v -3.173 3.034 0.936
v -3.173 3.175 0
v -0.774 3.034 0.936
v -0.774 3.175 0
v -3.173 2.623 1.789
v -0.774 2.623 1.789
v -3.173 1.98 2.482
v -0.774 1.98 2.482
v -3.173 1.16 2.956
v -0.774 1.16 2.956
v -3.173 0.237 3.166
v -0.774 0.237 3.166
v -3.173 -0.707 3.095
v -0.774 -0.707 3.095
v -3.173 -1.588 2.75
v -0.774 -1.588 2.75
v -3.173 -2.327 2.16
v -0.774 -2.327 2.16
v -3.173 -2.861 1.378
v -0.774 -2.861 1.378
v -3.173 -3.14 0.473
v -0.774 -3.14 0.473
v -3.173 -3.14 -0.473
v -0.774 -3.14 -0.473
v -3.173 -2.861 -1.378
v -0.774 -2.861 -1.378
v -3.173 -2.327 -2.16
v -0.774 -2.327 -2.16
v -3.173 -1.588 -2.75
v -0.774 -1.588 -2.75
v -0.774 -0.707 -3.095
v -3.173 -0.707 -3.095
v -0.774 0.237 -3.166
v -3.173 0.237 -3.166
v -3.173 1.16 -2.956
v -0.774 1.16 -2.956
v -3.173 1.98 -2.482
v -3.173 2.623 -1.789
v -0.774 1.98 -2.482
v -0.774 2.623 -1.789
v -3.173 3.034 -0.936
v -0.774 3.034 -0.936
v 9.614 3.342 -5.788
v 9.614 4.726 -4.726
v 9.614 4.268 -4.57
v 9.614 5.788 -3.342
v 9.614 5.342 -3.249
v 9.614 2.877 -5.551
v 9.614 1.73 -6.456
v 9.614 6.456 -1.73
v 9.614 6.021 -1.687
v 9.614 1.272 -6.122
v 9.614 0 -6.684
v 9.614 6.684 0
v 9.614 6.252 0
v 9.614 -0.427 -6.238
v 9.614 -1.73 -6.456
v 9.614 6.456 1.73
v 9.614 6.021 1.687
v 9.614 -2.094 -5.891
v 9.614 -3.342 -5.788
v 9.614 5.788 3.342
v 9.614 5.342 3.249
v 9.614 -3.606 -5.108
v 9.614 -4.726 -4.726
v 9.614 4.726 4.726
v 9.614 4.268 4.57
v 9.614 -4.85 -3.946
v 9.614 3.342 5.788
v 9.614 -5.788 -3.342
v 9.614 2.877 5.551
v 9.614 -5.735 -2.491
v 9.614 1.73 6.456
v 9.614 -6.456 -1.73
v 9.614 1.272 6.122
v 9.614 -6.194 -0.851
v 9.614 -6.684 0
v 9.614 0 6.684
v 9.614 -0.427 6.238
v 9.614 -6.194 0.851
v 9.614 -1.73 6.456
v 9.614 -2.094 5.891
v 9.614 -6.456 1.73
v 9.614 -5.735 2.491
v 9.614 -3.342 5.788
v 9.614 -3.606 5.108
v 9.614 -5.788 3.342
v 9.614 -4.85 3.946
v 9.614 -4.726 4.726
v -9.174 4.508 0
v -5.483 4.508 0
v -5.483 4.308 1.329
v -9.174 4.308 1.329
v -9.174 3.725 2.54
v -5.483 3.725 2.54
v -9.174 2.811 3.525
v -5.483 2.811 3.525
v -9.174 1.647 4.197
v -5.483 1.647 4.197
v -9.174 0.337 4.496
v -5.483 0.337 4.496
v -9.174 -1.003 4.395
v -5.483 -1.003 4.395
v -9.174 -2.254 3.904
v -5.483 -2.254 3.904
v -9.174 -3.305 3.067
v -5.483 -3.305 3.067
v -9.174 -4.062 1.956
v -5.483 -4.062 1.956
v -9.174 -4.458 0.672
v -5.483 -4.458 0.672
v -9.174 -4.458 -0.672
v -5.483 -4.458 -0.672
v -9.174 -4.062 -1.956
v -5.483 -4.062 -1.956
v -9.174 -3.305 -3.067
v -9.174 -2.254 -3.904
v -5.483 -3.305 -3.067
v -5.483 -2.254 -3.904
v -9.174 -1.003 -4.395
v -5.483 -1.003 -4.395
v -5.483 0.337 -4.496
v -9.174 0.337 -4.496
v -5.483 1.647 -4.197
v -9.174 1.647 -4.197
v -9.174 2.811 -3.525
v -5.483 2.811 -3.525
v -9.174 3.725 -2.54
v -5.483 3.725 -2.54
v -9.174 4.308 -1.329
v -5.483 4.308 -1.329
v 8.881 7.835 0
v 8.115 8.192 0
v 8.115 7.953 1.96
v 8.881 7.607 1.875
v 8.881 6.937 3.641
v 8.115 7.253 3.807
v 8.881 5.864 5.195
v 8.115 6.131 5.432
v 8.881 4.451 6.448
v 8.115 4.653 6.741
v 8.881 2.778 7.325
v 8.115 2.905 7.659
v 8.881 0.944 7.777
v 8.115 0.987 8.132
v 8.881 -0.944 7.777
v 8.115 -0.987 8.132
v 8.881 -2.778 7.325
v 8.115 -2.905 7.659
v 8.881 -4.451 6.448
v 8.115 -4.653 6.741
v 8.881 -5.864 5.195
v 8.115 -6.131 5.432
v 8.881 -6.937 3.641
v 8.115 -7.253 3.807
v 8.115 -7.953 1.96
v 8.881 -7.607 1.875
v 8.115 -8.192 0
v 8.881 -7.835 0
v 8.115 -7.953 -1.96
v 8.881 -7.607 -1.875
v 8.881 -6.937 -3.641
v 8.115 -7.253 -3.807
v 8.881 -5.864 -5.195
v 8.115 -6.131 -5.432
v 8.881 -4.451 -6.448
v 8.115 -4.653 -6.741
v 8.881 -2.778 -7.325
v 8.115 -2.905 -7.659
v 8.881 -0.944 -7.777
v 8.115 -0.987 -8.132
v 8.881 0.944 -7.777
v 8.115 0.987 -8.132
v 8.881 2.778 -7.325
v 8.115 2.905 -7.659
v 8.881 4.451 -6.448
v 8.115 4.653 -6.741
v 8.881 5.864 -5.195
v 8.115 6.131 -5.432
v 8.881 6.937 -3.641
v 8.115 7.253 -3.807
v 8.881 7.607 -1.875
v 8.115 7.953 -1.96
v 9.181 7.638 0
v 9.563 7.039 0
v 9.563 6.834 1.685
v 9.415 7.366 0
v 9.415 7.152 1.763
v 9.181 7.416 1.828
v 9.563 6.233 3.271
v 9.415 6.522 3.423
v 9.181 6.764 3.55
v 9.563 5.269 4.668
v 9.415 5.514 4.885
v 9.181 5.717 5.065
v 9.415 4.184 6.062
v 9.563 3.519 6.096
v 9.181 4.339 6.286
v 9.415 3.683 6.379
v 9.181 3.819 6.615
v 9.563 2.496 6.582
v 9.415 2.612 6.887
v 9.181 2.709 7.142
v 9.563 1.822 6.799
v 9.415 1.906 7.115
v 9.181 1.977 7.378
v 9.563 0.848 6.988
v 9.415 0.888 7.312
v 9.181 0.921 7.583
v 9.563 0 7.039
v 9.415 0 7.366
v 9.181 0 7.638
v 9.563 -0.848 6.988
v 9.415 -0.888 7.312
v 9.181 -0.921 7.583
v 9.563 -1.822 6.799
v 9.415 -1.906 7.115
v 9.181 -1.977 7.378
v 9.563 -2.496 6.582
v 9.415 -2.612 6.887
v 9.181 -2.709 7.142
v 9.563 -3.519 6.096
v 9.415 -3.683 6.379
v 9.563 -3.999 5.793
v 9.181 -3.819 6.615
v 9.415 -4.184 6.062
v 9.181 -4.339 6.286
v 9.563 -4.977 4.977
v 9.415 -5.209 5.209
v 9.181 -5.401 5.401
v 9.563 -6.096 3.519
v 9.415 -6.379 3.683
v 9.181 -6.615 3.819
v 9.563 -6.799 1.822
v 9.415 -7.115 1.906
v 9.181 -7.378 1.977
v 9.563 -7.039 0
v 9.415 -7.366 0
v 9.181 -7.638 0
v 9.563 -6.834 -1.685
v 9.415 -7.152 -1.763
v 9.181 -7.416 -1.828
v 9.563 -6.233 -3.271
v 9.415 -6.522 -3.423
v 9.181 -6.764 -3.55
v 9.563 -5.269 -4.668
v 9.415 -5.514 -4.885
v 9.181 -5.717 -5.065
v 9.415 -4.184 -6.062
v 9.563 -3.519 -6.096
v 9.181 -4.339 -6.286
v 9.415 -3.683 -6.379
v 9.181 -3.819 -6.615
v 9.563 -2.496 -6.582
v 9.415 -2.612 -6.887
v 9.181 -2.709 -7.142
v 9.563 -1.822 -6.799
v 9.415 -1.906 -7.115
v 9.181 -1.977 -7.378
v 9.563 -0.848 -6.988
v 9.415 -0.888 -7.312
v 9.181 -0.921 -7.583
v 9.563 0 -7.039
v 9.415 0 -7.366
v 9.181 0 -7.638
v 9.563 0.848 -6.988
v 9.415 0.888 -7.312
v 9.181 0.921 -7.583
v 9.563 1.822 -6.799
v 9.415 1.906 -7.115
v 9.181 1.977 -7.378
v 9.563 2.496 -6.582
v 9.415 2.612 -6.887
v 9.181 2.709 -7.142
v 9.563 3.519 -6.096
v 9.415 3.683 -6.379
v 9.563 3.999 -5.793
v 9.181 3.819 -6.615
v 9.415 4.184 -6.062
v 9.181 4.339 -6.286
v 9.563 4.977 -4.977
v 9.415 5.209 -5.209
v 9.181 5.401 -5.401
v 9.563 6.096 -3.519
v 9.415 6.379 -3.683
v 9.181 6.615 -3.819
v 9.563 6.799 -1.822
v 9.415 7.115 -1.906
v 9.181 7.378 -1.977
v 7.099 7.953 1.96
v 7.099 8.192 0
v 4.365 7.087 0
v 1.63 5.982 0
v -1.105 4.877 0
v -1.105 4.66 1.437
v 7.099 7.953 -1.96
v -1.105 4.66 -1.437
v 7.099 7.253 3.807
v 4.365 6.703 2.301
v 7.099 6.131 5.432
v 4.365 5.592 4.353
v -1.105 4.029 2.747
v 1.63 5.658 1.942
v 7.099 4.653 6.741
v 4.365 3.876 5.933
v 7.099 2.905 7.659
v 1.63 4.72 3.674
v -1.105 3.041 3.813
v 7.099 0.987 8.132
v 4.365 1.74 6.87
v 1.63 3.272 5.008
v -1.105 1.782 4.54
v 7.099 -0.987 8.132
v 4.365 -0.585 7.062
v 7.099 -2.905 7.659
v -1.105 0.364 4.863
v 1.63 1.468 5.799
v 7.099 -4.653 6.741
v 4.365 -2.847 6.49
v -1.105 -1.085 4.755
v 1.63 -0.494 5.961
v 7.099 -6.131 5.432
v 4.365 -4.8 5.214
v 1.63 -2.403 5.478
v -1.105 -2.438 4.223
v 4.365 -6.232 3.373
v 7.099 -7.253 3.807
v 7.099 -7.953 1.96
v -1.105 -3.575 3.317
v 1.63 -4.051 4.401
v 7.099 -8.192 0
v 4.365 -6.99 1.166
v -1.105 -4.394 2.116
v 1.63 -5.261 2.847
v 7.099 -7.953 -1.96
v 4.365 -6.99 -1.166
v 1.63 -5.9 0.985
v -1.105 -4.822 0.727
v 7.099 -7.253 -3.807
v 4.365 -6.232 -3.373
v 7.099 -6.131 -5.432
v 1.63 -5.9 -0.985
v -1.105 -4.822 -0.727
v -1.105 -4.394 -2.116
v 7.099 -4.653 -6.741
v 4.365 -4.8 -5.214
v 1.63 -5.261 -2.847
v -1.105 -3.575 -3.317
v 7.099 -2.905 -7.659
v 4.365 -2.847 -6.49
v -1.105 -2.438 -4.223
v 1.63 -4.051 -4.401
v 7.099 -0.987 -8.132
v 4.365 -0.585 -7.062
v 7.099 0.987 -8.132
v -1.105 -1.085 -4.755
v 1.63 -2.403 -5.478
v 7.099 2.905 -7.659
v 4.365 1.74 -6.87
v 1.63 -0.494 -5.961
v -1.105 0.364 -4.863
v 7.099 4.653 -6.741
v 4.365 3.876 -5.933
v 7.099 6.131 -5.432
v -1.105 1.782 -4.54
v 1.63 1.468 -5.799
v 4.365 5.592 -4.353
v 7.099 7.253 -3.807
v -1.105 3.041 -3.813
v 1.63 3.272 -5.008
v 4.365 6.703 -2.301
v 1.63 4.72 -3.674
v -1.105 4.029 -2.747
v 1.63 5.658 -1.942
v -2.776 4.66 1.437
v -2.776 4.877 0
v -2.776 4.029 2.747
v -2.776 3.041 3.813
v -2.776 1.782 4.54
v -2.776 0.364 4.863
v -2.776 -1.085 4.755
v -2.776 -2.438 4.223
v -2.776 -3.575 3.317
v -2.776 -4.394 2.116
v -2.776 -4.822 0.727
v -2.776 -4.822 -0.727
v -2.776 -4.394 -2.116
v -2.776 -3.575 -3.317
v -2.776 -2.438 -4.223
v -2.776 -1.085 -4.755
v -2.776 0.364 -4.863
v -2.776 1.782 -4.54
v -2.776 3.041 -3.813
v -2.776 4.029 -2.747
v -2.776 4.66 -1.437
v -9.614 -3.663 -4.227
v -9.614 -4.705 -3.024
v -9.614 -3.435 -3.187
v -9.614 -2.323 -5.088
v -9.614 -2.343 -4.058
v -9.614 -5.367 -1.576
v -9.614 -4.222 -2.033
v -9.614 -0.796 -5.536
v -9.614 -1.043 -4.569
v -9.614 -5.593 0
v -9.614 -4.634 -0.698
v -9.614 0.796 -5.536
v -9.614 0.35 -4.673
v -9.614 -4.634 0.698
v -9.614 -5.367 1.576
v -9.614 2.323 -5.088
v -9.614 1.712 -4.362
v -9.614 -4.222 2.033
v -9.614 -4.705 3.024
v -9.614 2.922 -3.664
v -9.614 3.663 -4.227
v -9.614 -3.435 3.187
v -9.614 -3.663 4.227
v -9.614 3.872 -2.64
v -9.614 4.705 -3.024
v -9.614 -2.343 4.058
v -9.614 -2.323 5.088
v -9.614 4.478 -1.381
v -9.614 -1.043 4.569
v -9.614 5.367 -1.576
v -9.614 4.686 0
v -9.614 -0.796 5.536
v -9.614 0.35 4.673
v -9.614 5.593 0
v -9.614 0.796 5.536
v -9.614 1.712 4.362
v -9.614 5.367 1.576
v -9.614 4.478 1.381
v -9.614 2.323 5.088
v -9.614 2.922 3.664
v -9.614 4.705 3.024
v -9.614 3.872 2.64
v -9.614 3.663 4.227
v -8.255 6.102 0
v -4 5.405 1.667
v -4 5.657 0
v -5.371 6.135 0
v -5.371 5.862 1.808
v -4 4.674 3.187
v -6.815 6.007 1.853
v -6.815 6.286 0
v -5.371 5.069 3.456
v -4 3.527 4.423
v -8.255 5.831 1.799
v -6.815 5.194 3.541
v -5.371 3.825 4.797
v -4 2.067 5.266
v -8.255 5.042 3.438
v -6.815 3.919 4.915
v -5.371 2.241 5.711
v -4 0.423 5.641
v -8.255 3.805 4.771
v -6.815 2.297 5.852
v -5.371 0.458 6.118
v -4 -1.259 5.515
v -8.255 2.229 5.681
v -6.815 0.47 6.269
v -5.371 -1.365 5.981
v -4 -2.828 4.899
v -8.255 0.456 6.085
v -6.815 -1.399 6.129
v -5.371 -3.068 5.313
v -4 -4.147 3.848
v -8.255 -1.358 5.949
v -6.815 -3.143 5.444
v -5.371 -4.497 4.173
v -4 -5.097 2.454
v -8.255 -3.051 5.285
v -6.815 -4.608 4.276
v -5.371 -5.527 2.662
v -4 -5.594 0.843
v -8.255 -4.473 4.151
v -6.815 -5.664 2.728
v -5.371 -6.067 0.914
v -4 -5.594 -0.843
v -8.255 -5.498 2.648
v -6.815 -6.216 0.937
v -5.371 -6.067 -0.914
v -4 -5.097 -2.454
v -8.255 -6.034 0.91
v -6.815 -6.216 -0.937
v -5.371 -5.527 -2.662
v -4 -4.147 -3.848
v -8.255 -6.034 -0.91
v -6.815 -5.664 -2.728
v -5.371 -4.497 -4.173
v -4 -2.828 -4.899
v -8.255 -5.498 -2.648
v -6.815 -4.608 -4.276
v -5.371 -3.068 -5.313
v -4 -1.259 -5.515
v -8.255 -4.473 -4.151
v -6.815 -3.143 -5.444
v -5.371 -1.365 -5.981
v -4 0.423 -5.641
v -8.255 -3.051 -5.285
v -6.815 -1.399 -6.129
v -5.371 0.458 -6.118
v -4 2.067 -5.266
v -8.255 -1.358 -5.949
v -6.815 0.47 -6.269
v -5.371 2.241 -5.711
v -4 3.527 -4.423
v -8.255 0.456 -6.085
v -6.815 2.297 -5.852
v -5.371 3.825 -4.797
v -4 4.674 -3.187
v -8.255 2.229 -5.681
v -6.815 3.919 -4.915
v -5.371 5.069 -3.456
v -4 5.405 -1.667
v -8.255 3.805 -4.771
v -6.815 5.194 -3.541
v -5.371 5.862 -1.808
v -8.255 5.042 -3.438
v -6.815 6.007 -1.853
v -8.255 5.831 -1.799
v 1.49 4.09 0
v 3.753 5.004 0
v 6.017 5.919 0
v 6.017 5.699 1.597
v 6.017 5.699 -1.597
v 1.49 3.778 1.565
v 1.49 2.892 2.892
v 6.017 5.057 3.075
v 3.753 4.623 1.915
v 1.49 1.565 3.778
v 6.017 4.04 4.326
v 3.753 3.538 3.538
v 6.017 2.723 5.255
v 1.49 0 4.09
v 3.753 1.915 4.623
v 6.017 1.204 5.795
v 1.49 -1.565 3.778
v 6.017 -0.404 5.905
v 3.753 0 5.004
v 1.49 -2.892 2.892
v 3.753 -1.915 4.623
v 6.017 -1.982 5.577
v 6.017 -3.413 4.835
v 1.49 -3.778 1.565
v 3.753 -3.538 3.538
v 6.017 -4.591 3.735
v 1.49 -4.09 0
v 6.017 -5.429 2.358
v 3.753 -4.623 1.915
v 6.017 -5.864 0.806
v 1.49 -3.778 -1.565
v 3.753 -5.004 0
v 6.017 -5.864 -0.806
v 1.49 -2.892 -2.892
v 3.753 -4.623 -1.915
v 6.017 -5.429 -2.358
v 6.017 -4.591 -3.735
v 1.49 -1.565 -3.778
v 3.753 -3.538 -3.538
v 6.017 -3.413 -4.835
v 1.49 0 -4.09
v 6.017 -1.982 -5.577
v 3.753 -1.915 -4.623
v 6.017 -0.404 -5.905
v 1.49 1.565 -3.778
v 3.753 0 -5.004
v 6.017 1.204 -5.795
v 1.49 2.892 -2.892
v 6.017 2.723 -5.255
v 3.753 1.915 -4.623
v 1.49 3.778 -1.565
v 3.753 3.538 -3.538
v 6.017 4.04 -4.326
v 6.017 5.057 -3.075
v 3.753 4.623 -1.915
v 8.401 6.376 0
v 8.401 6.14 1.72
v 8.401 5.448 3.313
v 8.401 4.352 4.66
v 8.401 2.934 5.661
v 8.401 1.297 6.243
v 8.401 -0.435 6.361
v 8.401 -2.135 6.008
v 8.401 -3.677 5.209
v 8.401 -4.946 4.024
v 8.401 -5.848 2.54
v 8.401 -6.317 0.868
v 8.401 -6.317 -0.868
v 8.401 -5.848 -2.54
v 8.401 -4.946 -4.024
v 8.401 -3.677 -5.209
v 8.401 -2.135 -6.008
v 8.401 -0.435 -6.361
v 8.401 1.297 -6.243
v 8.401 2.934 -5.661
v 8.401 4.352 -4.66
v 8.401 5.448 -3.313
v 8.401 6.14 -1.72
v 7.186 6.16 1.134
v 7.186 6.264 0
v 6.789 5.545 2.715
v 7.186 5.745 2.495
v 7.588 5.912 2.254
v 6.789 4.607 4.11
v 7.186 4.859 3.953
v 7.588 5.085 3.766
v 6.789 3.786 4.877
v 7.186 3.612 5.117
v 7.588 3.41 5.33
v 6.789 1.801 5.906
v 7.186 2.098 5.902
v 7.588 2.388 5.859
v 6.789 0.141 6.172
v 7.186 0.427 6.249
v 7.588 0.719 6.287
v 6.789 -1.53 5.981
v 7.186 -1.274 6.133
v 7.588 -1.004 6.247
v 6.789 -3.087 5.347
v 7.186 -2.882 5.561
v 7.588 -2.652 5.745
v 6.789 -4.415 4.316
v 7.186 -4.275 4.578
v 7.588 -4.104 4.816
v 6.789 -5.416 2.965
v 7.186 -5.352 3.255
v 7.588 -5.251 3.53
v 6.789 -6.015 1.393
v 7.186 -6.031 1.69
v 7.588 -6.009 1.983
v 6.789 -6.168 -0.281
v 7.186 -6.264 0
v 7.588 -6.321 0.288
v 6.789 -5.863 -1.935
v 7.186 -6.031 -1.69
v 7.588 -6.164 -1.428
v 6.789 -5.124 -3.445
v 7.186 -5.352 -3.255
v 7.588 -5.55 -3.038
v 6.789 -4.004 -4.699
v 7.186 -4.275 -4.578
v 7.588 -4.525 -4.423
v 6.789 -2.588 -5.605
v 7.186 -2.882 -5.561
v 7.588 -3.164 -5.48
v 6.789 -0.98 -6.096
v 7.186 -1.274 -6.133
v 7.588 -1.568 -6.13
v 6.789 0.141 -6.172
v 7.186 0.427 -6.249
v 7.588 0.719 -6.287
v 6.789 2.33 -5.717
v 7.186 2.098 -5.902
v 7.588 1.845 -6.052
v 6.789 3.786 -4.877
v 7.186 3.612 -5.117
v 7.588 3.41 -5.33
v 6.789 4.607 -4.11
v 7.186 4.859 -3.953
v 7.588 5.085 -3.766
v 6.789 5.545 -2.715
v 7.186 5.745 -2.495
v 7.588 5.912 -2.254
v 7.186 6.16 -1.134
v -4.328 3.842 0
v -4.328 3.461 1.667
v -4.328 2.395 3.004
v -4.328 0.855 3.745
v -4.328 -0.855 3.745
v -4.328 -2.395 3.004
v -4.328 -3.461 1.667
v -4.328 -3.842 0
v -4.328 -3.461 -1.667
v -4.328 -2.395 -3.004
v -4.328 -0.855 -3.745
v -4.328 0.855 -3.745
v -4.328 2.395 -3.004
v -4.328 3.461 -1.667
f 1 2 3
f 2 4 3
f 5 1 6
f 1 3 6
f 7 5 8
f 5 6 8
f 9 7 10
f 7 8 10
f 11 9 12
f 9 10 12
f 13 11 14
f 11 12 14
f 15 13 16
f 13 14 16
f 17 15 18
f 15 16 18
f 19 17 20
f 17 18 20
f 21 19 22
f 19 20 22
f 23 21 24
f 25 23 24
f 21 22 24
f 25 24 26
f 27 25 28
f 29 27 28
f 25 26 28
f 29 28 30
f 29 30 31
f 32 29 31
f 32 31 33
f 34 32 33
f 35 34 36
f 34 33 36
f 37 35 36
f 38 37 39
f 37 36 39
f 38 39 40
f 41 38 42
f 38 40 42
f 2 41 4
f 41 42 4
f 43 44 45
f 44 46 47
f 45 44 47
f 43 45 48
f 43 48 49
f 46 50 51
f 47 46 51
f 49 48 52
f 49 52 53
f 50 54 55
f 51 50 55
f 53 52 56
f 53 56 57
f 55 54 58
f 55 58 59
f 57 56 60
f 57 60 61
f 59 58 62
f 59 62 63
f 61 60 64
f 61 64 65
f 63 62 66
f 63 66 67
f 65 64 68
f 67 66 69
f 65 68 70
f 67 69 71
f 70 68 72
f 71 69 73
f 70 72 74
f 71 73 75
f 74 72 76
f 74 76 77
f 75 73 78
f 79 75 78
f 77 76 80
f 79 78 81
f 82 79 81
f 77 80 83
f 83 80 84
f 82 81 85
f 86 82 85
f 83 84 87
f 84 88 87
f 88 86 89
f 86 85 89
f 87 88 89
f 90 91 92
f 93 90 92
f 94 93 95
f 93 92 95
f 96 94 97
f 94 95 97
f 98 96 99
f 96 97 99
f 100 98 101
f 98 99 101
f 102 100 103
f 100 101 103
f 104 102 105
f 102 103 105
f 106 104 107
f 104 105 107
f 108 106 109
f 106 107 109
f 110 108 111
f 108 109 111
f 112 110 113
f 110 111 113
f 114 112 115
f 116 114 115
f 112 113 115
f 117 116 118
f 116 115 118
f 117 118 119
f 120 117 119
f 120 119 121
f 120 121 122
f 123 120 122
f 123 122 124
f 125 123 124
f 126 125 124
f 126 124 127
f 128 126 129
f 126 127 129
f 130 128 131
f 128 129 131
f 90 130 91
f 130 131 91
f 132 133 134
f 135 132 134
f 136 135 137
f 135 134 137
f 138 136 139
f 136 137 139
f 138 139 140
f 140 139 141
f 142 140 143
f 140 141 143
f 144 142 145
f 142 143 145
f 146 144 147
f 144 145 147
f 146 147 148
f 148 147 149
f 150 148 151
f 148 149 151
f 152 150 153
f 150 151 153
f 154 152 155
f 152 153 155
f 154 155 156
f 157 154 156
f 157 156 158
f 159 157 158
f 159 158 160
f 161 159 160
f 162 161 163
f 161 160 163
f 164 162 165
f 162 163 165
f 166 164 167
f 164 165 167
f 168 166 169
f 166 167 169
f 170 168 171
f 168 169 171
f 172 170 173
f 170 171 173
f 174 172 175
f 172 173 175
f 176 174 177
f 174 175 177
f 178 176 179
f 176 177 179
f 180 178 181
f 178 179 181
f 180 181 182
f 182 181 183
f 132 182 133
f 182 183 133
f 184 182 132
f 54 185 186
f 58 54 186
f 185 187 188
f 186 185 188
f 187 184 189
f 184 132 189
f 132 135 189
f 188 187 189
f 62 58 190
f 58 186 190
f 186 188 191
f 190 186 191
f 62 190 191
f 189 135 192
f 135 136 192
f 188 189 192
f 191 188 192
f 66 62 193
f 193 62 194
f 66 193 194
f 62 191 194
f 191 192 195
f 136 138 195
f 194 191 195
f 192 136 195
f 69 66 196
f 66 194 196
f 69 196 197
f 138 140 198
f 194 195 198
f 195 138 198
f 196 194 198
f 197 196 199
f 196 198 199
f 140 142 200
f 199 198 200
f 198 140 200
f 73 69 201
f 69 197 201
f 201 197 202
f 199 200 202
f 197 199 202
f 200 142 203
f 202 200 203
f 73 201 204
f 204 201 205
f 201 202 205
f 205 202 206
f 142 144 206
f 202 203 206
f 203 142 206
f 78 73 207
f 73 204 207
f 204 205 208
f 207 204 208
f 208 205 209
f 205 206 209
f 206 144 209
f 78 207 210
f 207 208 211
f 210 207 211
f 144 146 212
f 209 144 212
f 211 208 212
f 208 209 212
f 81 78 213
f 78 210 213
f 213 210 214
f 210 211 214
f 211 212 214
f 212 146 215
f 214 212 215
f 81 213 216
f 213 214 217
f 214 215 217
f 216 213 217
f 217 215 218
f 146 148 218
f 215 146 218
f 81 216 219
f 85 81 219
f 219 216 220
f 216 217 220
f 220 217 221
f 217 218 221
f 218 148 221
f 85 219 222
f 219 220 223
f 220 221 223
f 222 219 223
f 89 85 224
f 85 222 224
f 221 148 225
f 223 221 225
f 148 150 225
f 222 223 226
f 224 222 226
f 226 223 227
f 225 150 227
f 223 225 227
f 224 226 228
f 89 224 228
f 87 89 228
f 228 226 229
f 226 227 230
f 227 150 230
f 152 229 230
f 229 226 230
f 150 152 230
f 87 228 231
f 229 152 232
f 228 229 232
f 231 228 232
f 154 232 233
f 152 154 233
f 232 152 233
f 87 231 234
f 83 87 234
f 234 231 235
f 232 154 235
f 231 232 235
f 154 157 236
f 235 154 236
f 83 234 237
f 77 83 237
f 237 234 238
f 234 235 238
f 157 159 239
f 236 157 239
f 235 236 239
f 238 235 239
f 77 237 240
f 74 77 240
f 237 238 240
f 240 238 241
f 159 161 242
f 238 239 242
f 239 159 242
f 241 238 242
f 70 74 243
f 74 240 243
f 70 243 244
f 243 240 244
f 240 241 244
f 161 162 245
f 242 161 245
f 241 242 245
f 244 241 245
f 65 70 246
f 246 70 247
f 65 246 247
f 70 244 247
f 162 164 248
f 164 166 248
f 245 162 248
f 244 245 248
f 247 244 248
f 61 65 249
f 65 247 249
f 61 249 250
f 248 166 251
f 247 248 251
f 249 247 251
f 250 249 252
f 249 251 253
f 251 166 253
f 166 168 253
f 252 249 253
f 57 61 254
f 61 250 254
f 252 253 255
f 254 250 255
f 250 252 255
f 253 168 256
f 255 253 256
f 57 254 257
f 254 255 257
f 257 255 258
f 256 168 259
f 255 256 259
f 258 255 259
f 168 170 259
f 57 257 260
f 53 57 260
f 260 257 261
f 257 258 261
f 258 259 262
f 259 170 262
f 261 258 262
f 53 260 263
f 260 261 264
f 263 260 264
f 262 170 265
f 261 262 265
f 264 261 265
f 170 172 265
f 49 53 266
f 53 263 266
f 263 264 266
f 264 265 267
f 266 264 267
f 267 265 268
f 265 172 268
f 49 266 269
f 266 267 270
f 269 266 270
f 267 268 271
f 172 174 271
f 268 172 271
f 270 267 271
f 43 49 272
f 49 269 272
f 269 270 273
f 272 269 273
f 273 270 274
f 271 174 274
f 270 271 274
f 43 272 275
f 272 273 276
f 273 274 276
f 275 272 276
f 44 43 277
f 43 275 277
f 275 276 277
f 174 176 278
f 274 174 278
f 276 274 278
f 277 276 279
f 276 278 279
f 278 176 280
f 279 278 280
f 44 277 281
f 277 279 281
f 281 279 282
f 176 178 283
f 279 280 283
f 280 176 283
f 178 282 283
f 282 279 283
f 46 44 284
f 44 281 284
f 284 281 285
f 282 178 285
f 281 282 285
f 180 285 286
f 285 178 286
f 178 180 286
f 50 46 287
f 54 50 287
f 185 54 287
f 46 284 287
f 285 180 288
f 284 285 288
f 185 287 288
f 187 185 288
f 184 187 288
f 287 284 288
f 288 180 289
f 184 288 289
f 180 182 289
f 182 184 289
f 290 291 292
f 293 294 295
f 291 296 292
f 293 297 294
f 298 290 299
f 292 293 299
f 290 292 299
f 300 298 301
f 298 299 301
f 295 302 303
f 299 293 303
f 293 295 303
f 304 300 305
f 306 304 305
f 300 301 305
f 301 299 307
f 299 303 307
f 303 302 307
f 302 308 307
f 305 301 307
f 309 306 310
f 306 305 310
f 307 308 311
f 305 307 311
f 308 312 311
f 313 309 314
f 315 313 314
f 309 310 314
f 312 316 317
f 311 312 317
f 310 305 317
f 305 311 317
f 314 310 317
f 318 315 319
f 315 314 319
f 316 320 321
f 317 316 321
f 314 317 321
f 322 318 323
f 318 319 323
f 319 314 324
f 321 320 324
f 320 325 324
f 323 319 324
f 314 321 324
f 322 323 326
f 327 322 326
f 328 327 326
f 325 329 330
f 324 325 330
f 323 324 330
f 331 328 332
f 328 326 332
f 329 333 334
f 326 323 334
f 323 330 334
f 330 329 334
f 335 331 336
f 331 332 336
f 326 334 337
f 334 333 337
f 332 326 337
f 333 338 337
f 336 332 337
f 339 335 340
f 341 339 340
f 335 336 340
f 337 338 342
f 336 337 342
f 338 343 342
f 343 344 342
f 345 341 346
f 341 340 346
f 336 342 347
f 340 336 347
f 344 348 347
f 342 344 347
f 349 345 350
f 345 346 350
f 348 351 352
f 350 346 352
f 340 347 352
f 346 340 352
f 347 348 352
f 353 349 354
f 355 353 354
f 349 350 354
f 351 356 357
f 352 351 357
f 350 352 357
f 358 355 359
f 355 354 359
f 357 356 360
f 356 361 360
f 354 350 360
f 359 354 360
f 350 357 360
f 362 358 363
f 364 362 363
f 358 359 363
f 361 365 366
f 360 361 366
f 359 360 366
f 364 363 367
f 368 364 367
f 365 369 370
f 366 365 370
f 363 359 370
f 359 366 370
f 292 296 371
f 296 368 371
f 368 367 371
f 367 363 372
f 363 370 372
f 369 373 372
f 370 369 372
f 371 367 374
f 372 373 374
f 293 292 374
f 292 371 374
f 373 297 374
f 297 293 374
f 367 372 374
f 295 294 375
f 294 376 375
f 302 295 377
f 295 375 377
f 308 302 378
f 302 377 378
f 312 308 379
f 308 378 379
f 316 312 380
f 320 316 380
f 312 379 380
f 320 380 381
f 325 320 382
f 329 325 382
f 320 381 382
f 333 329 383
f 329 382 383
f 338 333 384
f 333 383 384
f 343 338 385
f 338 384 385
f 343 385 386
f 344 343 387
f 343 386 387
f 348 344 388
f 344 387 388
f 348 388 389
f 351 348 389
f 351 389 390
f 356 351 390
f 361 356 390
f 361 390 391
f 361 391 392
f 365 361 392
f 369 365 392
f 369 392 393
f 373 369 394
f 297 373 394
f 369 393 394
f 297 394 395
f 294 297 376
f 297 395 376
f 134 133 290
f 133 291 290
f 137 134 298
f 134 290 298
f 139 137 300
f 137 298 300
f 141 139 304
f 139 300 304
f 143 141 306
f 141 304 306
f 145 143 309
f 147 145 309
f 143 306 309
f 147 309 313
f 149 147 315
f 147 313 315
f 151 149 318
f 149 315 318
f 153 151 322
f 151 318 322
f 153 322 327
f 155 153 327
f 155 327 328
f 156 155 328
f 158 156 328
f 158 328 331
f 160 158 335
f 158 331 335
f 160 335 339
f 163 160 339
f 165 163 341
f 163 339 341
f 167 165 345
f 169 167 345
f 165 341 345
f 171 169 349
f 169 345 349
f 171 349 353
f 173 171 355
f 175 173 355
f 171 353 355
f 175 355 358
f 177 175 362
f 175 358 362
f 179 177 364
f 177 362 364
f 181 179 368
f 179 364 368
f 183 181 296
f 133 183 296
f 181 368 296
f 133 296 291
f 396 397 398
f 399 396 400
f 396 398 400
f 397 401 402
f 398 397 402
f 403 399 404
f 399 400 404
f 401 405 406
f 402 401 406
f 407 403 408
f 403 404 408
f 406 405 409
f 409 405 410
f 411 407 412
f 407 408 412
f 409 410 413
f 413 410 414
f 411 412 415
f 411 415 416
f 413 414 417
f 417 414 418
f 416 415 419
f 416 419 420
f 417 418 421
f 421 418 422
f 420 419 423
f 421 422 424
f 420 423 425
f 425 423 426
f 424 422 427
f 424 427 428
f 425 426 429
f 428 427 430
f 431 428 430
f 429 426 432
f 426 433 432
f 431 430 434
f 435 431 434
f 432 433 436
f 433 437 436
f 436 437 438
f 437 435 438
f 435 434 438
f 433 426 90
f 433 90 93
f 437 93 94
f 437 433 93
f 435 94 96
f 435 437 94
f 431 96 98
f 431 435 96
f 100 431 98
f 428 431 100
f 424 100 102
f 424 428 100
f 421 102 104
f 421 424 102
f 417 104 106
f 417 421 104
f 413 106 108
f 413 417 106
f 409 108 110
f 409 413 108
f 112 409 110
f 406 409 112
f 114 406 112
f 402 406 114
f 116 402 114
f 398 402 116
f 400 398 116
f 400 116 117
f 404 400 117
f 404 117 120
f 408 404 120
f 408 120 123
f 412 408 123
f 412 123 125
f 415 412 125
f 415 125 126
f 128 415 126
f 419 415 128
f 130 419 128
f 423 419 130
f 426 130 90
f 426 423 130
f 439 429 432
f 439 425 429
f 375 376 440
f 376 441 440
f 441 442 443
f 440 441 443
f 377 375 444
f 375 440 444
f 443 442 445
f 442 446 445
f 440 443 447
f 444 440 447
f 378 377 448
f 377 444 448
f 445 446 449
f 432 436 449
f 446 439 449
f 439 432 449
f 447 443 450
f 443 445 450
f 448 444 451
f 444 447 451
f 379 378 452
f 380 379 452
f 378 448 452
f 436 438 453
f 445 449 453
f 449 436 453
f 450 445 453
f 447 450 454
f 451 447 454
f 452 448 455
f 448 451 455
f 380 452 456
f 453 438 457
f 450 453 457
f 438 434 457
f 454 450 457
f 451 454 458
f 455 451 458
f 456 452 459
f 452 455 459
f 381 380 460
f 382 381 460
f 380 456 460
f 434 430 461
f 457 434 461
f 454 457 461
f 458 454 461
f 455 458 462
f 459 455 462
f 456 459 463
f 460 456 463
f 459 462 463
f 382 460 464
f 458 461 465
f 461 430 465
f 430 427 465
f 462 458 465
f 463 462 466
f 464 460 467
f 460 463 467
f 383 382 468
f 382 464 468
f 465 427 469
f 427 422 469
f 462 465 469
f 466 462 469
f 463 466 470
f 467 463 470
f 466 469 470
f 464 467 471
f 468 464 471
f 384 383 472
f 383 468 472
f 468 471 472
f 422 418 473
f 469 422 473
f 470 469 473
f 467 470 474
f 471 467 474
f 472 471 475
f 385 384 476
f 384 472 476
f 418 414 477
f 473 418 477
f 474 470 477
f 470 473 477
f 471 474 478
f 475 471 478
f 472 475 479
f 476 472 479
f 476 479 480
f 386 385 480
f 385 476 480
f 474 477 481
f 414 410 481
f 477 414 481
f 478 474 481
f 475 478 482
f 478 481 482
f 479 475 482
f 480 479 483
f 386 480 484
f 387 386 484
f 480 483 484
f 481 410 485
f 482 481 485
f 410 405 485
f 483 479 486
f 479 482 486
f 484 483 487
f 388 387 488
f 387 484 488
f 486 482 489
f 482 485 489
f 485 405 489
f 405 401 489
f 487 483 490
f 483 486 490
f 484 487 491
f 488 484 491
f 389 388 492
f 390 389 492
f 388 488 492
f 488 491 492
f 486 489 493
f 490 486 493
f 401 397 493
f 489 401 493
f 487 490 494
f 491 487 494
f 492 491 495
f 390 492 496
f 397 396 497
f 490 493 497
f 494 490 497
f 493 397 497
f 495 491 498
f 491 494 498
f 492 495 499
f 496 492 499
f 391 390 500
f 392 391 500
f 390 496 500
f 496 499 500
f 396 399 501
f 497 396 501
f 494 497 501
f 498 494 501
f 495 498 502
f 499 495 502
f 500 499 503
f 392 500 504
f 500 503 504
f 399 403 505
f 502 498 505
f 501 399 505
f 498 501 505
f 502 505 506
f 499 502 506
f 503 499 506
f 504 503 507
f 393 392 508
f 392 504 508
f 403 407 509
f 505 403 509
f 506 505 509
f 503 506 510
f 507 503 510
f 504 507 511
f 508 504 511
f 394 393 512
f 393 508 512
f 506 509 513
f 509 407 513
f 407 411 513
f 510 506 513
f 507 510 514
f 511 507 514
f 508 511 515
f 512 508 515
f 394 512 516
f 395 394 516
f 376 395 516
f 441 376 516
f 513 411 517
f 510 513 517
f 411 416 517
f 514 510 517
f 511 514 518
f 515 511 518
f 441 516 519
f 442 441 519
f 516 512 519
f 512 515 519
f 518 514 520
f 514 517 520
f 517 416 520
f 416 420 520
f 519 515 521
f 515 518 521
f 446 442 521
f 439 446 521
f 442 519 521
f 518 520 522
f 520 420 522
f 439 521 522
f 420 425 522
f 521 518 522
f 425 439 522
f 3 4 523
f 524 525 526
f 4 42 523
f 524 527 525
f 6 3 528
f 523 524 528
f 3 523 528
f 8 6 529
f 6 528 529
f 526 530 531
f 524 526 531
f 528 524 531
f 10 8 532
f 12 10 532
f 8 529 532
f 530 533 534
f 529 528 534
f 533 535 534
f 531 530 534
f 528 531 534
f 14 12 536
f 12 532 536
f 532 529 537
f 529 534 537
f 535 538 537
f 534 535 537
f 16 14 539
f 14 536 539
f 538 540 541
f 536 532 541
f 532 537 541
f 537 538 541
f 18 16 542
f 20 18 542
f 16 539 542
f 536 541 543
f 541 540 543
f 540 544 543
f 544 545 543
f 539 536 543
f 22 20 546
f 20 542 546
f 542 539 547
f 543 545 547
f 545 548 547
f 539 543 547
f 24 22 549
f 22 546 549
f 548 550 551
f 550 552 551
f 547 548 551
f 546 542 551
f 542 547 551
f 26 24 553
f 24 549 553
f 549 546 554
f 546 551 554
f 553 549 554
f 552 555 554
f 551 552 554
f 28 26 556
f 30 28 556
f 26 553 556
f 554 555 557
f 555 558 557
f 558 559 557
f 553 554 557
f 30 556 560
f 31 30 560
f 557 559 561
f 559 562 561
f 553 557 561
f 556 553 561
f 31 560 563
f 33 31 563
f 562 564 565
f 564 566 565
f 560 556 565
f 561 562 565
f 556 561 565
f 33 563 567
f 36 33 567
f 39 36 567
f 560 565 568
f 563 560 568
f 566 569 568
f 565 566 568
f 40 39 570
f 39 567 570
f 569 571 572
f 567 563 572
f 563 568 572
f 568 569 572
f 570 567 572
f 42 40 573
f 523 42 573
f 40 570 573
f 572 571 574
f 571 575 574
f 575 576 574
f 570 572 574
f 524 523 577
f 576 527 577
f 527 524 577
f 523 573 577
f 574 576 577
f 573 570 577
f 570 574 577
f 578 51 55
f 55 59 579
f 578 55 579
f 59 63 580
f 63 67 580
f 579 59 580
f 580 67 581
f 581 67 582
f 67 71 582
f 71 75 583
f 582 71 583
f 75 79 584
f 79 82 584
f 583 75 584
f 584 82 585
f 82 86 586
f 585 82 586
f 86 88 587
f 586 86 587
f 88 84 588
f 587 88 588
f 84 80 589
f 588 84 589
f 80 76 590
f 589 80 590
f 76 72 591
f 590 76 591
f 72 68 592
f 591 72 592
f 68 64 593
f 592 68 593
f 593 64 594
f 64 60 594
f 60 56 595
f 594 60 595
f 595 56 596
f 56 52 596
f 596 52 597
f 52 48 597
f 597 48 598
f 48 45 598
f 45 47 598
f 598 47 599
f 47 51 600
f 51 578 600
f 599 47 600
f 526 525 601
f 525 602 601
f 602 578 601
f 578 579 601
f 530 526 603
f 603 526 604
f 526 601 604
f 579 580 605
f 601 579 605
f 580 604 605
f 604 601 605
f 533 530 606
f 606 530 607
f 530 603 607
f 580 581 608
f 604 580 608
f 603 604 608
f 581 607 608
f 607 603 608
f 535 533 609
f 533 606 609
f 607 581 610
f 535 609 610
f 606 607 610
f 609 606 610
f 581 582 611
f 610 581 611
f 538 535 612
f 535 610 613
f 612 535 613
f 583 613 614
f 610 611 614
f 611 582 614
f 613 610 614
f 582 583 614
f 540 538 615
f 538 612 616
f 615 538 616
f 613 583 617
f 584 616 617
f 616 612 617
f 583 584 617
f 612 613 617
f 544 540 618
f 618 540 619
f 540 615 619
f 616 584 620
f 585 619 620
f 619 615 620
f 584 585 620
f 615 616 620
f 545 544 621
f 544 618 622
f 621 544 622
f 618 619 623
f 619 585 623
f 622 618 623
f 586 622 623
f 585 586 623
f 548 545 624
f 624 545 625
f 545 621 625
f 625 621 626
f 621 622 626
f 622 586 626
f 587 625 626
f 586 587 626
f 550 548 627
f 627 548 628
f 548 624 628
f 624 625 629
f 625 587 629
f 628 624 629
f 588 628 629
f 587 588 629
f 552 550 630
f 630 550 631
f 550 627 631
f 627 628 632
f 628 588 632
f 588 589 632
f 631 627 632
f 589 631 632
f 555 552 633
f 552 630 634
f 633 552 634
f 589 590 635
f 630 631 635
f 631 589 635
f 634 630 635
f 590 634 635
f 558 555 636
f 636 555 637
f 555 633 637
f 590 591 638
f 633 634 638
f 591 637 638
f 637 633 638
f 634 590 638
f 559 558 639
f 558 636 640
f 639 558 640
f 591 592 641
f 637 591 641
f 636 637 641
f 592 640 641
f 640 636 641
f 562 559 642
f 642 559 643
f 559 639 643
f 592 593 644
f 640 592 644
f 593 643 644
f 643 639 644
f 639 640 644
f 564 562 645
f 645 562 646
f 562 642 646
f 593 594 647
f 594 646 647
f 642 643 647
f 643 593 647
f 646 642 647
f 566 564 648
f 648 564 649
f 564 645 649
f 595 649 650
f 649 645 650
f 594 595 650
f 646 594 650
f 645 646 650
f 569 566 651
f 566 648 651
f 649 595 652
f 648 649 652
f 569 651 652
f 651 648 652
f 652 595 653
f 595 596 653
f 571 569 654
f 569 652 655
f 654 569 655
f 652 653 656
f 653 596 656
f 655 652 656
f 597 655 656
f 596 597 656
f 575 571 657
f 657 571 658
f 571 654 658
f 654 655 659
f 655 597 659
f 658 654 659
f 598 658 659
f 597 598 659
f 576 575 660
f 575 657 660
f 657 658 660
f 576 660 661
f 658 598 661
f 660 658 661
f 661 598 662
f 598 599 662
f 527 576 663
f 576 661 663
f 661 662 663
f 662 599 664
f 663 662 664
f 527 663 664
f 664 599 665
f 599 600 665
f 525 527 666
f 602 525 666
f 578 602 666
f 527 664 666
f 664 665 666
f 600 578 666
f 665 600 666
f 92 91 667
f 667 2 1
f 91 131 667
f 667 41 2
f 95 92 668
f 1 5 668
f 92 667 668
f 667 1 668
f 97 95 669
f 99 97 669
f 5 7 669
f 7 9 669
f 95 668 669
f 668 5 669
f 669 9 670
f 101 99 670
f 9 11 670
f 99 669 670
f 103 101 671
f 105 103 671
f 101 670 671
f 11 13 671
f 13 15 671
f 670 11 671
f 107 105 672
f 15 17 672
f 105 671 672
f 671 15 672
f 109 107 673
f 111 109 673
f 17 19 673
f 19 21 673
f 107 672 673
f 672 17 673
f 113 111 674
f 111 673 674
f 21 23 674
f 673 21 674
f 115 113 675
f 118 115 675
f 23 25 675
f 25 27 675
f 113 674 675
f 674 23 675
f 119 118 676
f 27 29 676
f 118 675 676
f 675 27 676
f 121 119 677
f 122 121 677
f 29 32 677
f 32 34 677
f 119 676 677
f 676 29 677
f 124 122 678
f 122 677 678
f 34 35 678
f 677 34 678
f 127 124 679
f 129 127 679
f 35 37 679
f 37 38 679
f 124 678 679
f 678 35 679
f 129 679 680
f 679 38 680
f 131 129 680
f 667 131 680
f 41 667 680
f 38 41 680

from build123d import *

# Parameters (mm, degrees)
FILLET1_R      = 1.27
CHAMFER1_SIZE  = 0.43942
CHAMFER1_SIZE2 = 0.177537204


with BuildPart() as part:
    # Sketch2 → Revolve1 (revolve)
    with BuildSketch(Plane.XY):
        with BuildLine():
            Line((-9.6139, 5.59308), (-9.6139, 4.5085))
            Line((-9.6139, 4.5085), (-5.482784752, 4.5085))
            Line((-5.482784752, 4.5085), (-3.173095, 3.175))
            Line((-3.173095, 3.175), (-0.77410359, 3.175))
            Line((-0.77410359, 3.175), (6.016717794, 5.918669934))
            ThreePointArc((6.016717794, 5.918669934), (7.790814141, 6.349535218), (9.6139, 6.252474944))
            Line((9.6139, 6.252474944), (9.6139, 7.492691343))
            Line((9.6139, 7.492691343), (8.1153, 8.1915))
            Line((8.1153, 8.1915), (7.099270393, 8.1915))
            Line((7.099270393, 8.1915), (-1.1049, 4.8768))
            Line((-1.1049, 4.8768), (-2.77622, 4.8768))
            ThreePointArc((-2.77622, 4.8768), (-6.088468301, 6.252474944), (-9.6139, 5.59308))
        make_face()
    revolve(axis=Axis((-152.4, 0, 0), (1, 0, 0)))

    # Fillet1
    fillet1_edges = [part.edges().sort_by_distance(p)[0] for p in [
        (9.6139, -7.492691343, 0),
    ]]
    fillet(fillet1_edges, radius=FILLET1_R)

    # Chamfer1
    chamfer1_edges = [part.edges().sort_by_distance(p)[0] for p in [
        (-9.6139, -4.5085, 0),
    ]]
    chamfer1_side = [part.faces().sort_by_distance(p)[0] for p in [
        (-7.548342376, -4.5085, 0),
    ]]
    chamfer(chamfer1_edges, length=CHAMFER1_SIZE, length2=CHAMFER1_SIZE2, reference=chamfer1_side[0])


solid = part.part
